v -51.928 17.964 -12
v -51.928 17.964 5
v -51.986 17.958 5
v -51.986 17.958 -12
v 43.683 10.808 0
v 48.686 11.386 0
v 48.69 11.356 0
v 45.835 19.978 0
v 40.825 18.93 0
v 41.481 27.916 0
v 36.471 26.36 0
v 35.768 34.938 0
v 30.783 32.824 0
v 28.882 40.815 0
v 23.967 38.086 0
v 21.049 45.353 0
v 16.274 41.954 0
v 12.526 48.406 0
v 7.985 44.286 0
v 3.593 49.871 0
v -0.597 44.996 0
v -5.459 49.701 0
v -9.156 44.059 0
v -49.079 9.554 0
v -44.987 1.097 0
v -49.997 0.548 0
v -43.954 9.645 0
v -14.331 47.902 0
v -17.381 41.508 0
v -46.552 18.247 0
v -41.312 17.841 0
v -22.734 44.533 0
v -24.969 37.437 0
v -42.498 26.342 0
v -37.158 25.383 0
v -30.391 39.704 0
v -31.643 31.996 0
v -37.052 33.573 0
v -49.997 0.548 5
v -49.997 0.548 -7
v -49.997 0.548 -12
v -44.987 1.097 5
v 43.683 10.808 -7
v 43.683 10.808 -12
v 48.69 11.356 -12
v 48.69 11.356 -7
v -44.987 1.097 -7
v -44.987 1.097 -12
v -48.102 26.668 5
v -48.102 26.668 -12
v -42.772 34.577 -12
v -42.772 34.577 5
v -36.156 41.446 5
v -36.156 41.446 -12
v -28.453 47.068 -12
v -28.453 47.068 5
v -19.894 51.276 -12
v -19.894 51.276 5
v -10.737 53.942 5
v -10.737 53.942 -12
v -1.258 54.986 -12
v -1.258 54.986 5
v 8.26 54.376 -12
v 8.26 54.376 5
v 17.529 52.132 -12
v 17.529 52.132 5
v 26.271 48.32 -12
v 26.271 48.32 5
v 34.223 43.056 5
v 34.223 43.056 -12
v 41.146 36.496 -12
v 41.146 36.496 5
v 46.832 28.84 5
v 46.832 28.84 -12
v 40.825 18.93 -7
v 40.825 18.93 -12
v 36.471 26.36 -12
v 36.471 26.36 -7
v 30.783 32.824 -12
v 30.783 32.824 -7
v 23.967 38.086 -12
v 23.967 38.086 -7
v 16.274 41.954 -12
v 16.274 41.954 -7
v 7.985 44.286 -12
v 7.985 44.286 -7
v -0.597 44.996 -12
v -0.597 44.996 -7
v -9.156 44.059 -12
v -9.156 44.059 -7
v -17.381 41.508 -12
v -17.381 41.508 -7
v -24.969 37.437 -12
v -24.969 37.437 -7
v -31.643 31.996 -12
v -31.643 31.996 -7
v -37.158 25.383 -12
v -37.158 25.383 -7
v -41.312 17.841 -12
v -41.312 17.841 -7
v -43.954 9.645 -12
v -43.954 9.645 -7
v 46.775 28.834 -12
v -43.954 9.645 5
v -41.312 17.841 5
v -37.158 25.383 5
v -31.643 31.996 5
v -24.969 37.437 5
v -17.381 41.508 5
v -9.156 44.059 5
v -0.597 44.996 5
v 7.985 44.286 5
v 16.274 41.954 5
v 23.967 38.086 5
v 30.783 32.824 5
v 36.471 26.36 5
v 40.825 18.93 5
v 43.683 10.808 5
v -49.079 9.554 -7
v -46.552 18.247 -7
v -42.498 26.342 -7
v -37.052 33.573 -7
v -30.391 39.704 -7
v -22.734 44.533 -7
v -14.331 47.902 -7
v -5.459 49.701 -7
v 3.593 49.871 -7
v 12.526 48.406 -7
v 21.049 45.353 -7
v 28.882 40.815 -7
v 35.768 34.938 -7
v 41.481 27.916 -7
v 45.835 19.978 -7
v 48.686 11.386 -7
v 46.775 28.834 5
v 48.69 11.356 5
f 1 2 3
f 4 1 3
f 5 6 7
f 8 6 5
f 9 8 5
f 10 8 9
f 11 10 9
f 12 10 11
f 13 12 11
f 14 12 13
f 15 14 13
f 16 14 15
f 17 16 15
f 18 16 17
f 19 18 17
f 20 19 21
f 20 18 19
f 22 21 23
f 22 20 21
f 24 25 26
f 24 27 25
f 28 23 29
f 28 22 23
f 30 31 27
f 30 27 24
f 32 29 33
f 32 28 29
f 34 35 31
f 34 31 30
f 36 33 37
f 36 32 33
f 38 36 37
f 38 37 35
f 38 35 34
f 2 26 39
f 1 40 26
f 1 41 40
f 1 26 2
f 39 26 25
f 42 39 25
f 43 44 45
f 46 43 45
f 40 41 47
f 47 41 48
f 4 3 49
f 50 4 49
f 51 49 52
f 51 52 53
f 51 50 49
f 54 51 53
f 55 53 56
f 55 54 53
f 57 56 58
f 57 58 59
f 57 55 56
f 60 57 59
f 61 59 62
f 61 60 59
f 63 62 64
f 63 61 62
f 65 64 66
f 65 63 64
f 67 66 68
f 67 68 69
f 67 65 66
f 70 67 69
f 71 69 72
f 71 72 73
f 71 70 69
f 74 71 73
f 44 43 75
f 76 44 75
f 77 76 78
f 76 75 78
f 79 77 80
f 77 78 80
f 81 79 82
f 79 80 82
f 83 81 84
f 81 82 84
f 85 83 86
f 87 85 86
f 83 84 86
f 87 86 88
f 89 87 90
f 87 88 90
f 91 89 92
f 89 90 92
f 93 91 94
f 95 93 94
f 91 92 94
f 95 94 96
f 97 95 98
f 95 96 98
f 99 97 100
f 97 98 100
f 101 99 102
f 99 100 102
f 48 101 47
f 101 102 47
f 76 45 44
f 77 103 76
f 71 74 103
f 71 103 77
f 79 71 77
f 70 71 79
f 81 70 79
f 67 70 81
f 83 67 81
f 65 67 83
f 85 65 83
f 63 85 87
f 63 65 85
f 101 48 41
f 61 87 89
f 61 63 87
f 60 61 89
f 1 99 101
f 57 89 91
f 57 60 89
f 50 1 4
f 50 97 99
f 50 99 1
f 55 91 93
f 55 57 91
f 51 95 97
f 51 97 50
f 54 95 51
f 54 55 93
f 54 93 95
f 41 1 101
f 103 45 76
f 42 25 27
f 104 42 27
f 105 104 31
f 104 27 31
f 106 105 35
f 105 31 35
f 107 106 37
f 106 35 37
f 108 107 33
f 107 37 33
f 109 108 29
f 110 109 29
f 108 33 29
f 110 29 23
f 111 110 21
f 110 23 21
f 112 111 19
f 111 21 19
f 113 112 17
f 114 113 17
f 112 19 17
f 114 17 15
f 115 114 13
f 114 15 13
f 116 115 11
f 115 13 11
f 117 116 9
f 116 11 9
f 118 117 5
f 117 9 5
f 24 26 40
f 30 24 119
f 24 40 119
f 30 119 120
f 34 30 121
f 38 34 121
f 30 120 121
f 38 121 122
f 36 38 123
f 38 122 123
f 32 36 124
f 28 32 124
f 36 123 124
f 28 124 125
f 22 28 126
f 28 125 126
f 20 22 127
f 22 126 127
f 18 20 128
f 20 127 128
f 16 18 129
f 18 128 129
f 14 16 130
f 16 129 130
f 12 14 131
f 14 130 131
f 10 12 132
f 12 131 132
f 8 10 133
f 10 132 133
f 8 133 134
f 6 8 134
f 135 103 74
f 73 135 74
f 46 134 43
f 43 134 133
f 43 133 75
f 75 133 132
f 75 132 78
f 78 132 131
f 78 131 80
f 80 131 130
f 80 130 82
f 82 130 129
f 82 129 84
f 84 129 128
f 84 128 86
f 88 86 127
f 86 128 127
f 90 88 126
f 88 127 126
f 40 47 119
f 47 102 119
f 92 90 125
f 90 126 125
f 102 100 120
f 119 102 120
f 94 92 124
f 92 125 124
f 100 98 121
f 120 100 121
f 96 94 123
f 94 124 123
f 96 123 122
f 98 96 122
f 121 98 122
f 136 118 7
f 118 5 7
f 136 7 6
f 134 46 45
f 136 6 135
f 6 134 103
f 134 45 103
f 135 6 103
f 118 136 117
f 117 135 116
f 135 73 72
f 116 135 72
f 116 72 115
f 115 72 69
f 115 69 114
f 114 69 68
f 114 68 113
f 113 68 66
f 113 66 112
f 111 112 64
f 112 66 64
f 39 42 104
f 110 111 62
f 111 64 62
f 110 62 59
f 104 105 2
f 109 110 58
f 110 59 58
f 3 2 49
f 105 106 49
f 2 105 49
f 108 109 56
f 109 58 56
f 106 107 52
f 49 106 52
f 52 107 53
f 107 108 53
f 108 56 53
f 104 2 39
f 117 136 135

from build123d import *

# Parameters (mm, degrees)
SKETCH1_W                    = 50
SKETCH1_H                    = 7
REVOLVE1_ANGLE               = 167.5
SHELL7_T                     = 5
CUT_EXTRUDE1_DEPTH           = 80.617837197
CUT_EXTRUDE1_DEPTH_BACK      = 10
CUT_EXTRUDE2_DEPTH           = 80.617837197
CUT_EXTRUDE2_DEPTH_BACK      = 10
CUT_EXTRUDE3_DEPTH           = 80.617837197
CUT_EXTRUDE3_DEPTH_BACK      = 10
CUT_EXTRUDE4_DEPTH           = 80.617837197
CUT_EXTRUDE4_DEPTH_BACK      = 10
CUT_EXTRUDE_THIN2_DEPTH      = 80.617837197
CUT_EXTRUDE_THIN2_DEPTH_BACK = 20
CUT_EXTRUDE_THIN3_DEPTH      = 80.617837197
CUT_EXTRUDE_THIN3_DEPTH_BACK = 20


with BuildPart() as part:
    # Sketch1 → Revolve1 (revolve)
    with BuildSketch(Plane(origin=(0, 0, 0), x_dir=(1, 0, 0), z_dir=(0, 1, 0))):
        with Locations((-25, 3.5)):
            Rectangle(SKETCH1_W, SKETCH1_H)
    revolve(axis=Axis((0, 0, 0), (0, 0, -1)), revolution_arc=REVOLVE1_ANGLE)

    # Shell7
    shell7_openings = [part.faces().sort_by_distance(p)[0] for p in [
        (-25, 0, -3.5),
        (24.407400178, 5.410990348, -3.5),
    ]]
    offset(amount=SHELL7_T, openings=shell7_openings, kind=Kind.INTERSECTION)

    # Sketch2 → Cut-Extrude1 (cut, two sides: drawn at the far end of the back side and taken through both)
    with BuildSketch(Plane.XY.offset(5).offset(-CUT_EXTRUDE1_DEPTH_BACK)):
        Polygon((-307.130564413, -27.612787673), (-55, 0), (53.696280392, 11.904178767), (305.826844804, 39.51696644), (361.05242015, -464.744162386), (-251.904989067, -531.873916498), align=None)
    extrude(amount=CUT_EXTRUDE1_DEPTH + CUT_EXTRUDE1_DEPTH_BACK, mode=Mode.SUBTRACT)

    # Sketch4 → Cut-Extrude2 (cut, two sides: drawn at the far end of the back side and taken through both)
    with BuildSketch(Plane(origin=(0, 0, -12), x_dir=(-1, 0, 0), z_dir=(0, 0, -1)).offset(-CUT_EXTRUDE2_DEPTH_BACK)):
        Polygon((-305.826844804, 39.51696644), (-53.696280392, 11.904178767), (55, 0), (307.130564413, -27.612787673), (251.904989067, -531.873916498), (-361.05242015, -464.744162386), align=None)
    extrude(amount=CUT_EXTRUDE2_DEPTH + CUT_EXTRUDE2_DEPTH_BACK, mode=Mode.SUBTRACT)

    # Sketch5 → Cut-Extrude3 (cut, two sides: drawn at the far end of the back side and taken through both)
    with BuildSketch(Plane.XY.offset(5).offset(-CUT_EXTRUDE3_DEPTH_BACK)):
        with BuildLine():
            Line((-50.710864423, -233.723704503), (-44.986635536, 1.096641764))
            ThreePointArc((-44.986635536, 1.096641764), (-4.899009368, 44.73253522), (43.682915928, 10.807537003))
            Line((43.682915928, 10.807537003), (100.095882825, -217.207679557))
            Line((100.095882825, -217.207679557), (151.239386336, -684.19567653))
            Line((151.239386336, -684.19567653), (0.432639088, -700.711701476))
            Line((0.432639088, -700.711701476), (-50.710864423, -233.723704503))
        make_face()
    extrude(amount=CUT_EXTRUDE3_DEPTH + CUT_EXTRUDE3_DEPTH_BACK, mode=Mode.SUBTRACT)

    # Sketch6 → Cut-Extrude4 (cut, two sides: drawn at the far end of the back side and taken through both)
    with BuildSketch(Plane(origin=(0, 0, -12), x_dir=(-1, 0, 0), z_dir=(0, 0, -1)).offset(-CUT_EXTRUDE4_DEPTH_BACK)):
        with BuildLine():
            Line((-100.095882825, -217.207679557), (-43.682915928, 10.807537003))
            ThreePointArc((-43.682915928, 10.807537003), (4.899009368, 44.73253522), (44.986635536, 1.096641764))
            Line((44.986635536, 1.096641764), (50.710864423, -233.723704503))
            Line((50.710864423, -233.723704503), (-0.432639088, -700.711701476))
            Line((-0.432639088, -700.711701476), (-151.239386336, -684.19567653))
            Line((-151.239386336, -684.19567653), (-100.095882825, -217.207679557))
        make_face()
    extrude(amount=CUT_EXTRUDE4_DEPTH + CUT_EXTRUDE4_DEPTH_BACK, mode=Mode.SUBTRACT)

    # Sketch13 → Cut-Extrude-Thin2 (cut, two sides: drawn at the far end of the back side and taken through both)
    with BuildSketch(Plane.XY.offset(5).offset(-CUT_EXTRUDE_THIN2_DEPTH_BACK)):
        Polygon((48.68959816, 11.355857885), (46.775458357, 28.833743654), (56.716021739, 29.922412403), (58.630161542, 12.444526633), align=None)
    extrude(amount=CUT_EXTRUDE_THIN2_DEPTH + CUT_EXTRUDE_THIN2_DEPTH_BACK, mode=Mode.SUBTRACT)

    # Sketch14 → Cut-Extrude-Thin3 (cut, two sides: drawn at the far end of the back side and taken through both)
    with BuildSketch(Plane.XY.offset(5).offset(-CUT_EXTRUDE_THIN3_DEPTH_BACK)):
        Polygon((-49.99699777, 0.547917856), (-51.927891207, 17.96441574), (-61.8669959, 16.862509251), (-59.936102463, -0.553988632), align=None)
    extrude(amount=CUT_EXTRUDE_THIN3_DEPTH + CUT_EXTRUDE_THIN3_DEPTH_BACK, mode=Mode.SUBTRACT)


solid = part.part
